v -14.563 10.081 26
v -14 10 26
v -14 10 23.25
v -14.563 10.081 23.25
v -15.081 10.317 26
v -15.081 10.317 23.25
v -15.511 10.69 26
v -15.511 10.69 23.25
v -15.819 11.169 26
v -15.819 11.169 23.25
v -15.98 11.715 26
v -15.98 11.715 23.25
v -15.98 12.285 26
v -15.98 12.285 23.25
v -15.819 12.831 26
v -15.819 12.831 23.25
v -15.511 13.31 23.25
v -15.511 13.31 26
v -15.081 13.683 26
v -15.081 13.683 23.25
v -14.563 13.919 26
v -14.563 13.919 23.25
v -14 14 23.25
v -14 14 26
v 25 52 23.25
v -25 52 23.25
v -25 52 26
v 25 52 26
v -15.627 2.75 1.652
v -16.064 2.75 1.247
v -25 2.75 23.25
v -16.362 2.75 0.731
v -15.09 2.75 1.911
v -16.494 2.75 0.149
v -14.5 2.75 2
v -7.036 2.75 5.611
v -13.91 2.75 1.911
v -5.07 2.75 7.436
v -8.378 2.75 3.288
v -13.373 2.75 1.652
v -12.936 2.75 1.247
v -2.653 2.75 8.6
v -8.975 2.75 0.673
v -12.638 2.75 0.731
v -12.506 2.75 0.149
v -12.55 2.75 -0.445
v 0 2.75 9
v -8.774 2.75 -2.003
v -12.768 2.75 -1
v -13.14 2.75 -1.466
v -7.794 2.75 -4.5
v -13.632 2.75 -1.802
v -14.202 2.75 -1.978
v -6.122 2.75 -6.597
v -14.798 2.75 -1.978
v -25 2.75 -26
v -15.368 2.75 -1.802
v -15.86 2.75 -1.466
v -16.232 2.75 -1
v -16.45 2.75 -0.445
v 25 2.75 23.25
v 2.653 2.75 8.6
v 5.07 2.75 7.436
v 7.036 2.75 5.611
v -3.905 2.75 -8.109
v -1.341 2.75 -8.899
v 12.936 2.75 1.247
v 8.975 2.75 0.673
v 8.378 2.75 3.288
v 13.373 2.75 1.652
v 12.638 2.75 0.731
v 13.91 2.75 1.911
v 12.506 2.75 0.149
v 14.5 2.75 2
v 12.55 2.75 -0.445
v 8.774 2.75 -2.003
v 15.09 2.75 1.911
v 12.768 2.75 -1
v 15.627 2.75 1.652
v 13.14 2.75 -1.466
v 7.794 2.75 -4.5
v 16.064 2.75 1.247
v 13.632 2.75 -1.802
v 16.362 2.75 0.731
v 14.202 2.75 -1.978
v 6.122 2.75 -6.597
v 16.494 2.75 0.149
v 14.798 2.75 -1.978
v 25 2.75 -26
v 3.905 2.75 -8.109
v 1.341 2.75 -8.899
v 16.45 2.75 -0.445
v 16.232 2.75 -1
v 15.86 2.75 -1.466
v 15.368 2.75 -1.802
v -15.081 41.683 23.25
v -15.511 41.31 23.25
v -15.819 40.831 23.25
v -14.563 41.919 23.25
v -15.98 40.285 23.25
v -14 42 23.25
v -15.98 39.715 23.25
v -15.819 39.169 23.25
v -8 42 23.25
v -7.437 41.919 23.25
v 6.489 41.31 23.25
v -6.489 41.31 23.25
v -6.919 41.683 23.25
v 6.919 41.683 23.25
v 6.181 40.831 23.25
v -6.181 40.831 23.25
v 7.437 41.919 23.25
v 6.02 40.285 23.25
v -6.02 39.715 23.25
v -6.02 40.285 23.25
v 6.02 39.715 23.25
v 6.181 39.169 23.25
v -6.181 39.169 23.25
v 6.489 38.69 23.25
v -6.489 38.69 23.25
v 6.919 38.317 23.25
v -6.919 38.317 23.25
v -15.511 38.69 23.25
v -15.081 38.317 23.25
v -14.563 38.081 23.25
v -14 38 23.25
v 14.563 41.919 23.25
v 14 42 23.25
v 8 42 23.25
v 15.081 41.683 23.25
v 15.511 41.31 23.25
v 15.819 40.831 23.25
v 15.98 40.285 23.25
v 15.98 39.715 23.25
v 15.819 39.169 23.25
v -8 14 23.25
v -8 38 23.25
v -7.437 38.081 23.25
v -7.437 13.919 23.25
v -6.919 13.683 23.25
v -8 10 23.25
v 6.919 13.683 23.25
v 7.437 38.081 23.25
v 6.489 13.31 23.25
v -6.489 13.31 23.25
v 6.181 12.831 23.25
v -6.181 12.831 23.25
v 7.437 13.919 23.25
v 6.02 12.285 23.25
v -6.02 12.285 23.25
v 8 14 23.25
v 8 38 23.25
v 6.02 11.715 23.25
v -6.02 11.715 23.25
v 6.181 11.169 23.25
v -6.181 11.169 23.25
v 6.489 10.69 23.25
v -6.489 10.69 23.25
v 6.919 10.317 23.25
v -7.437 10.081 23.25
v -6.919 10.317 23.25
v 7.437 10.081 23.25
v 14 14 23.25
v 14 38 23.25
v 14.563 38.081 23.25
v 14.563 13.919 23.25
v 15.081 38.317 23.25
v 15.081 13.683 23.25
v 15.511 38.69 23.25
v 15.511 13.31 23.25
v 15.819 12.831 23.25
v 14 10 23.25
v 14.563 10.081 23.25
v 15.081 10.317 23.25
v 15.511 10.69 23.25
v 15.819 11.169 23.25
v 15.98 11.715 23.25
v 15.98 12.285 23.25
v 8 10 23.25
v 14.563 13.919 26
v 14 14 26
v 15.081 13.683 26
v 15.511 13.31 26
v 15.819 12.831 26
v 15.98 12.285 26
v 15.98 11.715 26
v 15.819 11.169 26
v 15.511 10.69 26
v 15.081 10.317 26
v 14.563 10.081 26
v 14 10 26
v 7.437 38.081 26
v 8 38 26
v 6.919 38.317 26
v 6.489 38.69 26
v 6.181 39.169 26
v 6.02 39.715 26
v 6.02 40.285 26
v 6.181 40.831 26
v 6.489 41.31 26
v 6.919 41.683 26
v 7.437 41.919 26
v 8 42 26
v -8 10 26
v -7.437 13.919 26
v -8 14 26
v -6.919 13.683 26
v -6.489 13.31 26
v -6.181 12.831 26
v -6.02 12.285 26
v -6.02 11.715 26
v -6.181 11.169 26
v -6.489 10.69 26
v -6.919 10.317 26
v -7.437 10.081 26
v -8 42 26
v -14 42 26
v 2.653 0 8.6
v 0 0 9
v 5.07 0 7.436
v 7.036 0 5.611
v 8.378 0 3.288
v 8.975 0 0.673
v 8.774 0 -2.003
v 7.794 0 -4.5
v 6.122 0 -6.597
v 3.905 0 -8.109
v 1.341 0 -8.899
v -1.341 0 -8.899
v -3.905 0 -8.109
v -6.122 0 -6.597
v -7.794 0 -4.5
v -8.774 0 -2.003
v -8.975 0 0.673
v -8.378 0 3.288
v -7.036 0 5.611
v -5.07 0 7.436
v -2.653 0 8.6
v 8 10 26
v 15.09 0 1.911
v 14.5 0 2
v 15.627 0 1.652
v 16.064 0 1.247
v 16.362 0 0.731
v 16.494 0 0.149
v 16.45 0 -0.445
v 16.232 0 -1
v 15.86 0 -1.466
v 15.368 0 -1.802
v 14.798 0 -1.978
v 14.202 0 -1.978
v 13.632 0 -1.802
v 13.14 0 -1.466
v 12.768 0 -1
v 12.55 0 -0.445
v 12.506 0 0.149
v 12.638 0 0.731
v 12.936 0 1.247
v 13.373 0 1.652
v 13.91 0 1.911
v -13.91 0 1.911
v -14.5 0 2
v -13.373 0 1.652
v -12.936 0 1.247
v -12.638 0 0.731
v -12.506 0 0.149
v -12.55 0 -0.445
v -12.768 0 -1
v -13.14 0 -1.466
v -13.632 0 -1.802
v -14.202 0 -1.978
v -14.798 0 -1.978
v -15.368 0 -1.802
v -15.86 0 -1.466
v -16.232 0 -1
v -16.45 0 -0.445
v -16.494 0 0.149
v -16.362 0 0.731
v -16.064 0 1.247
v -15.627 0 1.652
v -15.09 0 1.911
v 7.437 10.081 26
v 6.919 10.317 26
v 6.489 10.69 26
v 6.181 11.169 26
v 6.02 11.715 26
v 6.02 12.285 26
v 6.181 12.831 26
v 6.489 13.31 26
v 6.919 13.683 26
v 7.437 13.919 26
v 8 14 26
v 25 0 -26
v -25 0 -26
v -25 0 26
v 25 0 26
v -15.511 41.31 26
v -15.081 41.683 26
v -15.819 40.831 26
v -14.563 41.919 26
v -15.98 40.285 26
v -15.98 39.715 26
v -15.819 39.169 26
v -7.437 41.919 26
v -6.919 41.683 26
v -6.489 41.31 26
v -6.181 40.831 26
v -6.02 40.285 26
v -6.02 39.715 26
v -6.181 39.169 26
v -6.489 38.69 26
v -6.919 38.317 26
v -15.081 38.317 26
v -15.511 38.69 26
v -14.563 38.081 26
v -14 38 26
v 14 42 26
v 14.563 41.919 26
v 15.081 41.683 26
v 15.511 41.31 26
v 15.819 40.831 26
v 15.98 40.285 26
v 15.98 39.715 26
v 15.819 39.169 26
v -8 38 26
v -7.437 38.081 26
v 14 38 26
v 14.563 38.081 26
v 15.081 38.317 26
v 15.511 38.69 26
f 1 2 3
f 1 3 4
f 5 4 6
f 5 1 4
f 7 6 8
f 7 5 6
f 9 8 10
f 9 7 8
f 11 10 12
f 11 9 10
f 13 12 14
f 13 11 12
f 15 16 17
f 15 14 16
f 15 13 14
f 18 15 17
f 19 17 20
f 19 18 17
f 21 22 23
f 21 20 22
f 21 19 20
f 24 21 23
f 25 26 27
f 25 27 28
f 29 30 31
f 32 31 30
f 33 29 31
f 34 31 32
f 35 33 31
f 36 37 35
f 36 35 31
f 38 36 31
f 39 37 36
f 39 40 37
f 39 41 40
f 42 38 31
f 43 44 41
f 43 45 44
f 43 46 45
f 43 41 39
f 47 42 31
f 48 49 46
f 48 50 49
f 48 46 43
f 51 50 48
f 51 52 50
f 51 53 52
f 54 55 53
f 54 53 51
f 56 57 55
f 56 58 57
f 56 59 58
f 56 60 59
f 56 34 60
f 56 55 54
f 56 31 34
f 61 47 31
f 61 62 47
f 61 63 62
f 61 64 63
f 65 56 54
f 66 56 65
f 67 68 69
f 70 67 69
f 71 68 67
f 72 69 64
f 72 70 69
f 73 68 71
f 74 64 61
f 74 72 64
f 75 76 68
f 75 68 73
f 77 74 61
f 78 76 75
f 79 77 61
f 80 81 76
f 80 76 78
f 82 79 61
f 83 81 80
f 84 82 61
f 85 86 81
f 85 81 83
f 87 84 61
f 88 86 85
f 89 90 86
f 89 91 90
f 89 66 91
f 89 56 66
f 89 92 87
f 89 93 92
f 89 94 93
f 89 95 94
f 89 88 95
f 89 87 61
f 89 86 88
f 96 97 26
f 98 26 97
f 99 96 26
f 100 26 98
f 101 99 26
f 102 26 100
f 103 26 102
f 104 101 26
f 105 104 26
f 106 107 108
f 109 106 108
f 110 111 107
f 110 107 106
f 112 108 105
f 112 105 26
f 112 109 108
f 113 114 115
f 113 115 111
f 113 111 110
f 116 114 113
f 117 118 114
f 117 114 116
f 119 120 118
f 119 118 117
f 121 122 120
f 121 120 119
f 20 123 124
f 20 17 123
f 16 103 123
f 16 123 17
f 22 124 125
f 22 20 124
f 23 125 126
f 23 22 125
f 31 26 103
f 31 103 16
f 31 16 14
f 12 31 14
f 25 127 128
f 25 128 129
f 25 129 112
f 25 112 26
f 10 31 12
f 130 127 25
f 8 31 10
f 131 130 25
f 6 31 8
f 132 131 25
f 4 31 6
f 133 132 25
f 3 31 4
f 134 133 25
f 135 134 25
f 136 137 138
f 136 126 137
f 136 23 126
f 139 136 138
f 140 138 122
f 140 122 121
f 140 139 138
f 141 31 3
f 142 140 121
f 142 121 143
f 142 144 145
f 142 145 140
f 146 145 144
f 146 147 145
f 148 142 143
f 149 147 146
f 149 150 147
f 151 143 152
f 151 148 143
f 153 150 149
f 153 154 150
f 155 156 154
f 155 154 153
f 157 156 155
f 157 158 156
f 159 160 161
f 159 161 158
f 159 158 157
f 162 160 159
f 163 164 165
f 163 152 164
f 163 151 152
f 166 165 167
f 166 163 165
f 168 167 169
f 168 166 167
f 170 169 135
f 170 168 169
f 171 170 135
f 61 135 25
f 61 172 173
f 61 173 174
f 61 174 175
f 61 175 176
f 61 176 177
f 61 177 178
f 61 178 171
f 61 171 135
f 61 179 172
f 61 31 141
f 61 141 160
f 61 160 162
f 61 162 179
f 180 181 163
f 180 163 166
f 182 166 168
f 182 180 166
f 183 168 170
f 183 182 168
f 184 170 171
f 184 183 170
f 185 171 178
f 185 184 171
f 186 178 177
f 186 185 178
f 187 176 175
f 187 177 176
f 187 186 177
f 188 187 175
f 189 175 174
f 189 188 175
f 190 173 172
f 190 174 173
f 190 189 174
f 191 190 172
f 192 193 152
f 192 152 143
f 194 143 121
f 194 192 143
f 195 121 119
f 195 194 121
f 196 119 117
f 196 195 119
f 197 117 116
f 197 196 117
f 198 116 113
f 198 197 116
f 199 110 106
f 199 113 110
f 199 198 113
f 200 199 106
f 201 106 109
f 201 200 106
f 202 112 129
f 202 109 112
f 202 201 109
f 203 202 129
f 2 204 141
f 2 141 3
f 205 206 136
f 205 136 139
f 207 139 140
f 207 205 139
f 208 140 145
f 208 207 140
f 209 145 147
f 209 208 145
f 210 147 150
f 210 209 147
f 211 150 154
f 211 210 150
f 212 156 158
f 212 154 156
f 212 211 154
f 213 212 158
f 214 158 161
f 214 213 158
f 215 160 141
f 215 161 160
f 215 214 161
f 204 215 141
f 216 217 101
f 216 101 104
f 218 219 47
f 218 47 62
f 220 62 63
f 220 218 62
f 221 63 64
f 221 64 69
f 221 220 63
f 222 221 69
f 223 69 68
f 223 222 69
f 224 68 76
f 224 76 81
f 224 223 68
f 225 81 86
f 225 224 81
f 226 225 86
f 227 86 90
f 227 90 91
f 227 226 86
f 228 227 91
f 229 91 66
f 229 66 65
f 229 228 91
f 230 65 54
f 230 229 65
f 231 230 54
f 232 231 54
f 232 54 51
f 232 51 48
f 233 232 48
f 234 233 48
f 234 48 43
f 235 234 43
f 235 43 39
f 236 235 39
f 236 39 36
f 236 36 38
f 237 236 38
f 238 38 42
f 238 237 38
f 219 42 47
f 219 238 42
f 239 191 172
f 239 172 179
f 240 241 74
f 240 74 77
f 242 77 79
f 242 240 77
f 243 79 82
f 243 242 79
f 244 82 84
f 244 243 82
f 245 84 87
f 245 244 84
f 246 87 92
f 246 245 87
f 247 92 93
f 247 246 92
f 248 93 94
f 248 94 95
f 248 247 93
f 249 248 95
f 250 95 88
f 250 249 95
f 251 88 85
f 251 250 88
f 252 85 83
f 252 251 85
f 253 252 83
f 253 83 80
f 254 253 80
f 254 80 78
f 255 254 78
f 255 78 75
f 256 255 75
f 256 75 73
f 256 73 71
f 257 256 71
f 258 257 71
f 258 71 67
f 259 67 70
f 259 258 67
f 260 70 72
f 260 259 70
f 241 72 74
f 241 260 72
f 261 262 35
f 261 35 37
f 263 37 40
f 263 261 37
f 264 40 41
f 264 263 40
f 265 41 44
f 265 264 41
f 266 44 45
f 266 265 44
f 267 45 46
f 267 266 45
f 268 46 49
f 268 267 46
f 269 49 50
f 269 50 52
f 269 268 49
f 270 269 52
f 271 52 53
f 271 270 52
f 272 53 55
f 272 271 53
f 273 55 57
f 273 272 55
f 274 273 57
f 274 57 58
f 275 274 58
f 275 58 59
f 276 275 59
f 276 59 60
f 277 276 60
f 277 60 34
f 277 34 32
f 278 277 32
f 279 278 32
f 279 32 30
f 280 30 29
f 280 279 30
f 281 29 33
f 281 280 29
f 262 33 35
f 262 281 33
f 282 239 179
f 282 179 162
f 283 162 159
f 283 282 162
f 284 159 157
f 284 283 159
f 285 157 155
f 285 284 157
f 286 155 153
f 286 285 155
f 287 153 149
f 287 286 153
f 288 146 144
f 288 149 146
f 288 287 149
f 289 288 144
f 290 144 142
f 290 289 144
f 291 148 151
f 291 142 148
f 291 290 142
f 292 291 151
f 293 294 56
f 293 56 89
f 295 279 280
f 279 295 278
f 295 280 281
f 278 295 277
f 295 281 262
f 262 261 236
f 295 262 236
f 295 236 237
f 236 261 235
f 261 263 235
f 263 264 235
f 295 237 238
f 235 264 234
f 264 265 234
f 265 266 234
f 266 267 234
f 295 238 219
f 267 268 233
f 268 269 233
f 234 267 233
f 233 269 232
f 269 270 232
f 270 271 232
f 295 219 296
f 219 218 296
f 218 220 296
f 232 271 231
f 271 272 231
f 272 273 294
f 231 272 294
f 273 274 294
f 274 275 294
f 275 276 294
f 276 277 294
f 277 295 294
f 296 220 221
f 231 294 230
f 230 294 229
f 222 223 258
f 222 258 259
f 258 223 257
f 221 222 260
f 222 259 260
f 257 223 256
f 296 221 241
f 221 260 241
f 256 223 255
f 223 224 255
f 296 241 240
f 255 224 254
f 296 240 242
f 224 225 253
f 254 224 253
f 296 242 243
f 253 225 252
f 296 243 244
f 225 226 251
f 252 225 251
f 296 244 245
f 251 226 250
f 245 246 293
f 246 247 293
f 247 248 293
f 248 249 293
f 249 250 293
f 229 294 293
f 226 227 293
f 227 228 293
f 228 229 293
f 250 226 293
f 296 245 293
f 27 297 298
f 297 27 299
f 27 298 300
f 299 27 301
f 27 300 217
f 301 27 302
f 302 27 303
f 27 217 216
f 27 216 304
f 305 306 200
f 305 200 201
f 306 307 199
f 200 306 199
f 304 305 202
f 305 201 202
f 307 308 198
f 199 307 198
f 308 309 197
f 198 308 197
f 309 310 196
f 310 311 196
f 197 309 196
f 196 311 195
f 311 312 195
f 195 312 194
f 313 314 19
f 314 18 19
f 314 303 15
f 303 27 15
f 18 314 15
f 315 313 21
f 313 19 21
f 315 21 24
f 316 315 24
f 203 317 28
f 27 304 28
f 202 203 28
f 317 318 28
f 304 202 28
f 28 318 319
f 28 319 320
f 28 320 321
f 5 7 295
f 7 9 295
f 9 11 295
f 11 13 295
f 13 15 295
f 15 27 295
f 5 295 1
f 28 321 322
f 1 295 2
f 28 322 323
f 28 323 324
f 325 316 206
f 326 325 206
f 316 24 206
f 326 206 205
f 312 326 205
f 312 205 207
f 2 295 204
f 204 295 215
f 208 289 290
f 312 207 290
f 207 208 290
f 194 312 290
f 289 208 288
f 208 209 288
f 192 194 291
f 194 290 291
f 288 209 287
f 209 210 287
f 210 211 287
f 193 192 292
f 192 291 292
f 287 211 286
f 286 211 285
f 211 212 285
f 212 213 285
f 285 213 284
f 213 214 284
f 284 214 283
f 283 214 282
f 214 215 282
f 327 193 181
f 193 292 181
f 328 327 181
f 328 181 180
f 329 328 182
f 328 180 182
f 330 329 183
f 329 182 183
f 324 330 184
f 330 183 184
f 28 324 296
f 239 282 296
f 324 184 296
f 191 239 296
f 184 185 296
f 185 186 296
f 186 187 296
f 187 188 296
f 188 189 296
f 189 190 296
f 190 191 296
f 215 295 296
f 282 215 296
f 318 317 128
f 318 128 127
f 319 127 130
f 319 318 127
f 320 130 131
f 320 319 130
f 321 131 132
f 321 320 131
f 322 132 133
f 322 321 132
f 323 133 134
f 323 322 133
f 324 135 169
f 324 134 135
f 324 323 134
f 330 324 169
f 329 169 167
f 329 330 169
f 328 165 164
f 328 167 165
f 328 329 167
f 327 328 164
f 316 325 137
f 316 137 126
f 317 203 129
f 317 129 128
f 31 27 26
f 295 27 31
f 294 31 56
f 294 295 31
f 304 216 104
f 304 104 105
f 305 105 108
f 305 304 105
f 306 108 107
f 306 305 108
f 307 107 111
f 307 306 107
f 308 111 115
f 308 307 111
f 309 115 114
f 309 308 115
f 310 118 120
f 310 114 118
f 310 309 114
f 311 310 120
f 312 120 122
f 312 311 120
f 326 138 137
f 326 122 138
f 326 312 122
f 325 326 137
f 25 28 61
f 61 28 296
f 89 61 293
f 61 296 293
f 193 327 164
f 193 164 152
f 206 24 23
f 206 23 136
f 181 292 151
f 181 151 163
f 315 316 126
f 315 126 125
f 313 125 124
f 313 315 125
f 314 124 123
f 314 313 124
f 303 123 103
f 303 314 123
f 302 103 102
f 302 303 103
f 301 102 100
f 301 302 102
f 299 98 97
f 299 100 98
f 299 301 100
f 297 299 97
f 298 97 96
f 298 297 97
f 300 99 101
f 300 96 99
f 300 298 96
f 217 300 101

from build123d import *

# Parameters (mm, degrees)
SKETCH1_W           = 50
SKETCH1_H           = 52
SKETCH1_R           = 9
SKETCH1_R_2         = 2
BOSS_EXTRUDE1_DEPTH = 2.75
SKETCH2_W           = 50
SKETCH2_H           = 2.75
BOSS_EXTRUDE2_DEPTH = 52
CUT_EXTRUDE1_DEPTH  = 78.672388917


with BuildPart() as part:
    # Sketch1 → Boss-Extrude1 (new body)
    with BuildSketch(Plane(origin=(0, 0, 0), x_dir=(1, 0, 0), z_dir=(0, 1, 0))):
        Rectangle(SKETCH1_W, SKETCH1_H)
        with Locations(Location((0, 0, 0), (0, 0, 270))):
            Circle(SKETCH1_R, mode=Mode.SUBTRACT)
        with Locations(Location((-14.5, 0, 0), (0, 0, 270))):
            Circle(SKETCH1_R_2, mode=Mode.SUBTRACT)
        with Locations(Location((14.5, 0, 0), (0, 0, 270))):
            Circle(SKETCH1_R_2, mode=Mode.SUBTRACT)
    extrude(amount=BOSS_EXTRUDE1_DEPTH)

    # Sketch2 → Boss-Extrude2 (add)
    with BuildSketch(Plane(origin=(0, 0, 0), x_dir=(1, 0, 0), z_dir=(0, 1, 0))):
        with Locations((0, -24.625)):
            Rectangle(SKETCH2_W, SKETCH2_H)
    extrude(amount=BOSS_EXTRUDE2_DEPTH)

    # Sketch4 → Cut-Extrude1 (cut, through all)
    with BuildSketch(Plane.XY.offset(26)):
        with BuildLine():
            Line((-14, 14), (-8, 14))
            ThreePointArc((-8, 14), (-6, 12), (-8, 10))
            Line((-8, 10), (-14, 10))
            ThreePointArc((-14, 10), (-16, 12), (-14, 14))
        make_face()
        with BuildLine():
            Line((8, 14), (14, 14))
            ThreePointArc((14, 14), (16, 12), (14, 10))
            Line((14, 10), (8, 10))
            ThreePointArc((8, 10), (6, 12), (8, 14))
        make_face()
        with BuildLine():
            Line((8, 42), (14, 42))
            ThreePointArc((14, 42), (16, 40), (14, 38))
            Line((14, 38), (8, 38))
            ThreePointArc((8, 38), (6, 40), (8, 42))
        make_face()
        with BuildLine():
            Line((-14, 42), (-8, 42))
            ThreePointArc((-8, 42), (-6, 40), (-8, 38))
            Line((-8, 38), (-14, 38))
            ThreePointArc((-14, 38), (-16, 40), (-14, 42))
        make_face()
    extrude(amount=-CUT_EXTRUDE1_DEPTH, mode=Mode.SUBTRACT)


solid = part.part
